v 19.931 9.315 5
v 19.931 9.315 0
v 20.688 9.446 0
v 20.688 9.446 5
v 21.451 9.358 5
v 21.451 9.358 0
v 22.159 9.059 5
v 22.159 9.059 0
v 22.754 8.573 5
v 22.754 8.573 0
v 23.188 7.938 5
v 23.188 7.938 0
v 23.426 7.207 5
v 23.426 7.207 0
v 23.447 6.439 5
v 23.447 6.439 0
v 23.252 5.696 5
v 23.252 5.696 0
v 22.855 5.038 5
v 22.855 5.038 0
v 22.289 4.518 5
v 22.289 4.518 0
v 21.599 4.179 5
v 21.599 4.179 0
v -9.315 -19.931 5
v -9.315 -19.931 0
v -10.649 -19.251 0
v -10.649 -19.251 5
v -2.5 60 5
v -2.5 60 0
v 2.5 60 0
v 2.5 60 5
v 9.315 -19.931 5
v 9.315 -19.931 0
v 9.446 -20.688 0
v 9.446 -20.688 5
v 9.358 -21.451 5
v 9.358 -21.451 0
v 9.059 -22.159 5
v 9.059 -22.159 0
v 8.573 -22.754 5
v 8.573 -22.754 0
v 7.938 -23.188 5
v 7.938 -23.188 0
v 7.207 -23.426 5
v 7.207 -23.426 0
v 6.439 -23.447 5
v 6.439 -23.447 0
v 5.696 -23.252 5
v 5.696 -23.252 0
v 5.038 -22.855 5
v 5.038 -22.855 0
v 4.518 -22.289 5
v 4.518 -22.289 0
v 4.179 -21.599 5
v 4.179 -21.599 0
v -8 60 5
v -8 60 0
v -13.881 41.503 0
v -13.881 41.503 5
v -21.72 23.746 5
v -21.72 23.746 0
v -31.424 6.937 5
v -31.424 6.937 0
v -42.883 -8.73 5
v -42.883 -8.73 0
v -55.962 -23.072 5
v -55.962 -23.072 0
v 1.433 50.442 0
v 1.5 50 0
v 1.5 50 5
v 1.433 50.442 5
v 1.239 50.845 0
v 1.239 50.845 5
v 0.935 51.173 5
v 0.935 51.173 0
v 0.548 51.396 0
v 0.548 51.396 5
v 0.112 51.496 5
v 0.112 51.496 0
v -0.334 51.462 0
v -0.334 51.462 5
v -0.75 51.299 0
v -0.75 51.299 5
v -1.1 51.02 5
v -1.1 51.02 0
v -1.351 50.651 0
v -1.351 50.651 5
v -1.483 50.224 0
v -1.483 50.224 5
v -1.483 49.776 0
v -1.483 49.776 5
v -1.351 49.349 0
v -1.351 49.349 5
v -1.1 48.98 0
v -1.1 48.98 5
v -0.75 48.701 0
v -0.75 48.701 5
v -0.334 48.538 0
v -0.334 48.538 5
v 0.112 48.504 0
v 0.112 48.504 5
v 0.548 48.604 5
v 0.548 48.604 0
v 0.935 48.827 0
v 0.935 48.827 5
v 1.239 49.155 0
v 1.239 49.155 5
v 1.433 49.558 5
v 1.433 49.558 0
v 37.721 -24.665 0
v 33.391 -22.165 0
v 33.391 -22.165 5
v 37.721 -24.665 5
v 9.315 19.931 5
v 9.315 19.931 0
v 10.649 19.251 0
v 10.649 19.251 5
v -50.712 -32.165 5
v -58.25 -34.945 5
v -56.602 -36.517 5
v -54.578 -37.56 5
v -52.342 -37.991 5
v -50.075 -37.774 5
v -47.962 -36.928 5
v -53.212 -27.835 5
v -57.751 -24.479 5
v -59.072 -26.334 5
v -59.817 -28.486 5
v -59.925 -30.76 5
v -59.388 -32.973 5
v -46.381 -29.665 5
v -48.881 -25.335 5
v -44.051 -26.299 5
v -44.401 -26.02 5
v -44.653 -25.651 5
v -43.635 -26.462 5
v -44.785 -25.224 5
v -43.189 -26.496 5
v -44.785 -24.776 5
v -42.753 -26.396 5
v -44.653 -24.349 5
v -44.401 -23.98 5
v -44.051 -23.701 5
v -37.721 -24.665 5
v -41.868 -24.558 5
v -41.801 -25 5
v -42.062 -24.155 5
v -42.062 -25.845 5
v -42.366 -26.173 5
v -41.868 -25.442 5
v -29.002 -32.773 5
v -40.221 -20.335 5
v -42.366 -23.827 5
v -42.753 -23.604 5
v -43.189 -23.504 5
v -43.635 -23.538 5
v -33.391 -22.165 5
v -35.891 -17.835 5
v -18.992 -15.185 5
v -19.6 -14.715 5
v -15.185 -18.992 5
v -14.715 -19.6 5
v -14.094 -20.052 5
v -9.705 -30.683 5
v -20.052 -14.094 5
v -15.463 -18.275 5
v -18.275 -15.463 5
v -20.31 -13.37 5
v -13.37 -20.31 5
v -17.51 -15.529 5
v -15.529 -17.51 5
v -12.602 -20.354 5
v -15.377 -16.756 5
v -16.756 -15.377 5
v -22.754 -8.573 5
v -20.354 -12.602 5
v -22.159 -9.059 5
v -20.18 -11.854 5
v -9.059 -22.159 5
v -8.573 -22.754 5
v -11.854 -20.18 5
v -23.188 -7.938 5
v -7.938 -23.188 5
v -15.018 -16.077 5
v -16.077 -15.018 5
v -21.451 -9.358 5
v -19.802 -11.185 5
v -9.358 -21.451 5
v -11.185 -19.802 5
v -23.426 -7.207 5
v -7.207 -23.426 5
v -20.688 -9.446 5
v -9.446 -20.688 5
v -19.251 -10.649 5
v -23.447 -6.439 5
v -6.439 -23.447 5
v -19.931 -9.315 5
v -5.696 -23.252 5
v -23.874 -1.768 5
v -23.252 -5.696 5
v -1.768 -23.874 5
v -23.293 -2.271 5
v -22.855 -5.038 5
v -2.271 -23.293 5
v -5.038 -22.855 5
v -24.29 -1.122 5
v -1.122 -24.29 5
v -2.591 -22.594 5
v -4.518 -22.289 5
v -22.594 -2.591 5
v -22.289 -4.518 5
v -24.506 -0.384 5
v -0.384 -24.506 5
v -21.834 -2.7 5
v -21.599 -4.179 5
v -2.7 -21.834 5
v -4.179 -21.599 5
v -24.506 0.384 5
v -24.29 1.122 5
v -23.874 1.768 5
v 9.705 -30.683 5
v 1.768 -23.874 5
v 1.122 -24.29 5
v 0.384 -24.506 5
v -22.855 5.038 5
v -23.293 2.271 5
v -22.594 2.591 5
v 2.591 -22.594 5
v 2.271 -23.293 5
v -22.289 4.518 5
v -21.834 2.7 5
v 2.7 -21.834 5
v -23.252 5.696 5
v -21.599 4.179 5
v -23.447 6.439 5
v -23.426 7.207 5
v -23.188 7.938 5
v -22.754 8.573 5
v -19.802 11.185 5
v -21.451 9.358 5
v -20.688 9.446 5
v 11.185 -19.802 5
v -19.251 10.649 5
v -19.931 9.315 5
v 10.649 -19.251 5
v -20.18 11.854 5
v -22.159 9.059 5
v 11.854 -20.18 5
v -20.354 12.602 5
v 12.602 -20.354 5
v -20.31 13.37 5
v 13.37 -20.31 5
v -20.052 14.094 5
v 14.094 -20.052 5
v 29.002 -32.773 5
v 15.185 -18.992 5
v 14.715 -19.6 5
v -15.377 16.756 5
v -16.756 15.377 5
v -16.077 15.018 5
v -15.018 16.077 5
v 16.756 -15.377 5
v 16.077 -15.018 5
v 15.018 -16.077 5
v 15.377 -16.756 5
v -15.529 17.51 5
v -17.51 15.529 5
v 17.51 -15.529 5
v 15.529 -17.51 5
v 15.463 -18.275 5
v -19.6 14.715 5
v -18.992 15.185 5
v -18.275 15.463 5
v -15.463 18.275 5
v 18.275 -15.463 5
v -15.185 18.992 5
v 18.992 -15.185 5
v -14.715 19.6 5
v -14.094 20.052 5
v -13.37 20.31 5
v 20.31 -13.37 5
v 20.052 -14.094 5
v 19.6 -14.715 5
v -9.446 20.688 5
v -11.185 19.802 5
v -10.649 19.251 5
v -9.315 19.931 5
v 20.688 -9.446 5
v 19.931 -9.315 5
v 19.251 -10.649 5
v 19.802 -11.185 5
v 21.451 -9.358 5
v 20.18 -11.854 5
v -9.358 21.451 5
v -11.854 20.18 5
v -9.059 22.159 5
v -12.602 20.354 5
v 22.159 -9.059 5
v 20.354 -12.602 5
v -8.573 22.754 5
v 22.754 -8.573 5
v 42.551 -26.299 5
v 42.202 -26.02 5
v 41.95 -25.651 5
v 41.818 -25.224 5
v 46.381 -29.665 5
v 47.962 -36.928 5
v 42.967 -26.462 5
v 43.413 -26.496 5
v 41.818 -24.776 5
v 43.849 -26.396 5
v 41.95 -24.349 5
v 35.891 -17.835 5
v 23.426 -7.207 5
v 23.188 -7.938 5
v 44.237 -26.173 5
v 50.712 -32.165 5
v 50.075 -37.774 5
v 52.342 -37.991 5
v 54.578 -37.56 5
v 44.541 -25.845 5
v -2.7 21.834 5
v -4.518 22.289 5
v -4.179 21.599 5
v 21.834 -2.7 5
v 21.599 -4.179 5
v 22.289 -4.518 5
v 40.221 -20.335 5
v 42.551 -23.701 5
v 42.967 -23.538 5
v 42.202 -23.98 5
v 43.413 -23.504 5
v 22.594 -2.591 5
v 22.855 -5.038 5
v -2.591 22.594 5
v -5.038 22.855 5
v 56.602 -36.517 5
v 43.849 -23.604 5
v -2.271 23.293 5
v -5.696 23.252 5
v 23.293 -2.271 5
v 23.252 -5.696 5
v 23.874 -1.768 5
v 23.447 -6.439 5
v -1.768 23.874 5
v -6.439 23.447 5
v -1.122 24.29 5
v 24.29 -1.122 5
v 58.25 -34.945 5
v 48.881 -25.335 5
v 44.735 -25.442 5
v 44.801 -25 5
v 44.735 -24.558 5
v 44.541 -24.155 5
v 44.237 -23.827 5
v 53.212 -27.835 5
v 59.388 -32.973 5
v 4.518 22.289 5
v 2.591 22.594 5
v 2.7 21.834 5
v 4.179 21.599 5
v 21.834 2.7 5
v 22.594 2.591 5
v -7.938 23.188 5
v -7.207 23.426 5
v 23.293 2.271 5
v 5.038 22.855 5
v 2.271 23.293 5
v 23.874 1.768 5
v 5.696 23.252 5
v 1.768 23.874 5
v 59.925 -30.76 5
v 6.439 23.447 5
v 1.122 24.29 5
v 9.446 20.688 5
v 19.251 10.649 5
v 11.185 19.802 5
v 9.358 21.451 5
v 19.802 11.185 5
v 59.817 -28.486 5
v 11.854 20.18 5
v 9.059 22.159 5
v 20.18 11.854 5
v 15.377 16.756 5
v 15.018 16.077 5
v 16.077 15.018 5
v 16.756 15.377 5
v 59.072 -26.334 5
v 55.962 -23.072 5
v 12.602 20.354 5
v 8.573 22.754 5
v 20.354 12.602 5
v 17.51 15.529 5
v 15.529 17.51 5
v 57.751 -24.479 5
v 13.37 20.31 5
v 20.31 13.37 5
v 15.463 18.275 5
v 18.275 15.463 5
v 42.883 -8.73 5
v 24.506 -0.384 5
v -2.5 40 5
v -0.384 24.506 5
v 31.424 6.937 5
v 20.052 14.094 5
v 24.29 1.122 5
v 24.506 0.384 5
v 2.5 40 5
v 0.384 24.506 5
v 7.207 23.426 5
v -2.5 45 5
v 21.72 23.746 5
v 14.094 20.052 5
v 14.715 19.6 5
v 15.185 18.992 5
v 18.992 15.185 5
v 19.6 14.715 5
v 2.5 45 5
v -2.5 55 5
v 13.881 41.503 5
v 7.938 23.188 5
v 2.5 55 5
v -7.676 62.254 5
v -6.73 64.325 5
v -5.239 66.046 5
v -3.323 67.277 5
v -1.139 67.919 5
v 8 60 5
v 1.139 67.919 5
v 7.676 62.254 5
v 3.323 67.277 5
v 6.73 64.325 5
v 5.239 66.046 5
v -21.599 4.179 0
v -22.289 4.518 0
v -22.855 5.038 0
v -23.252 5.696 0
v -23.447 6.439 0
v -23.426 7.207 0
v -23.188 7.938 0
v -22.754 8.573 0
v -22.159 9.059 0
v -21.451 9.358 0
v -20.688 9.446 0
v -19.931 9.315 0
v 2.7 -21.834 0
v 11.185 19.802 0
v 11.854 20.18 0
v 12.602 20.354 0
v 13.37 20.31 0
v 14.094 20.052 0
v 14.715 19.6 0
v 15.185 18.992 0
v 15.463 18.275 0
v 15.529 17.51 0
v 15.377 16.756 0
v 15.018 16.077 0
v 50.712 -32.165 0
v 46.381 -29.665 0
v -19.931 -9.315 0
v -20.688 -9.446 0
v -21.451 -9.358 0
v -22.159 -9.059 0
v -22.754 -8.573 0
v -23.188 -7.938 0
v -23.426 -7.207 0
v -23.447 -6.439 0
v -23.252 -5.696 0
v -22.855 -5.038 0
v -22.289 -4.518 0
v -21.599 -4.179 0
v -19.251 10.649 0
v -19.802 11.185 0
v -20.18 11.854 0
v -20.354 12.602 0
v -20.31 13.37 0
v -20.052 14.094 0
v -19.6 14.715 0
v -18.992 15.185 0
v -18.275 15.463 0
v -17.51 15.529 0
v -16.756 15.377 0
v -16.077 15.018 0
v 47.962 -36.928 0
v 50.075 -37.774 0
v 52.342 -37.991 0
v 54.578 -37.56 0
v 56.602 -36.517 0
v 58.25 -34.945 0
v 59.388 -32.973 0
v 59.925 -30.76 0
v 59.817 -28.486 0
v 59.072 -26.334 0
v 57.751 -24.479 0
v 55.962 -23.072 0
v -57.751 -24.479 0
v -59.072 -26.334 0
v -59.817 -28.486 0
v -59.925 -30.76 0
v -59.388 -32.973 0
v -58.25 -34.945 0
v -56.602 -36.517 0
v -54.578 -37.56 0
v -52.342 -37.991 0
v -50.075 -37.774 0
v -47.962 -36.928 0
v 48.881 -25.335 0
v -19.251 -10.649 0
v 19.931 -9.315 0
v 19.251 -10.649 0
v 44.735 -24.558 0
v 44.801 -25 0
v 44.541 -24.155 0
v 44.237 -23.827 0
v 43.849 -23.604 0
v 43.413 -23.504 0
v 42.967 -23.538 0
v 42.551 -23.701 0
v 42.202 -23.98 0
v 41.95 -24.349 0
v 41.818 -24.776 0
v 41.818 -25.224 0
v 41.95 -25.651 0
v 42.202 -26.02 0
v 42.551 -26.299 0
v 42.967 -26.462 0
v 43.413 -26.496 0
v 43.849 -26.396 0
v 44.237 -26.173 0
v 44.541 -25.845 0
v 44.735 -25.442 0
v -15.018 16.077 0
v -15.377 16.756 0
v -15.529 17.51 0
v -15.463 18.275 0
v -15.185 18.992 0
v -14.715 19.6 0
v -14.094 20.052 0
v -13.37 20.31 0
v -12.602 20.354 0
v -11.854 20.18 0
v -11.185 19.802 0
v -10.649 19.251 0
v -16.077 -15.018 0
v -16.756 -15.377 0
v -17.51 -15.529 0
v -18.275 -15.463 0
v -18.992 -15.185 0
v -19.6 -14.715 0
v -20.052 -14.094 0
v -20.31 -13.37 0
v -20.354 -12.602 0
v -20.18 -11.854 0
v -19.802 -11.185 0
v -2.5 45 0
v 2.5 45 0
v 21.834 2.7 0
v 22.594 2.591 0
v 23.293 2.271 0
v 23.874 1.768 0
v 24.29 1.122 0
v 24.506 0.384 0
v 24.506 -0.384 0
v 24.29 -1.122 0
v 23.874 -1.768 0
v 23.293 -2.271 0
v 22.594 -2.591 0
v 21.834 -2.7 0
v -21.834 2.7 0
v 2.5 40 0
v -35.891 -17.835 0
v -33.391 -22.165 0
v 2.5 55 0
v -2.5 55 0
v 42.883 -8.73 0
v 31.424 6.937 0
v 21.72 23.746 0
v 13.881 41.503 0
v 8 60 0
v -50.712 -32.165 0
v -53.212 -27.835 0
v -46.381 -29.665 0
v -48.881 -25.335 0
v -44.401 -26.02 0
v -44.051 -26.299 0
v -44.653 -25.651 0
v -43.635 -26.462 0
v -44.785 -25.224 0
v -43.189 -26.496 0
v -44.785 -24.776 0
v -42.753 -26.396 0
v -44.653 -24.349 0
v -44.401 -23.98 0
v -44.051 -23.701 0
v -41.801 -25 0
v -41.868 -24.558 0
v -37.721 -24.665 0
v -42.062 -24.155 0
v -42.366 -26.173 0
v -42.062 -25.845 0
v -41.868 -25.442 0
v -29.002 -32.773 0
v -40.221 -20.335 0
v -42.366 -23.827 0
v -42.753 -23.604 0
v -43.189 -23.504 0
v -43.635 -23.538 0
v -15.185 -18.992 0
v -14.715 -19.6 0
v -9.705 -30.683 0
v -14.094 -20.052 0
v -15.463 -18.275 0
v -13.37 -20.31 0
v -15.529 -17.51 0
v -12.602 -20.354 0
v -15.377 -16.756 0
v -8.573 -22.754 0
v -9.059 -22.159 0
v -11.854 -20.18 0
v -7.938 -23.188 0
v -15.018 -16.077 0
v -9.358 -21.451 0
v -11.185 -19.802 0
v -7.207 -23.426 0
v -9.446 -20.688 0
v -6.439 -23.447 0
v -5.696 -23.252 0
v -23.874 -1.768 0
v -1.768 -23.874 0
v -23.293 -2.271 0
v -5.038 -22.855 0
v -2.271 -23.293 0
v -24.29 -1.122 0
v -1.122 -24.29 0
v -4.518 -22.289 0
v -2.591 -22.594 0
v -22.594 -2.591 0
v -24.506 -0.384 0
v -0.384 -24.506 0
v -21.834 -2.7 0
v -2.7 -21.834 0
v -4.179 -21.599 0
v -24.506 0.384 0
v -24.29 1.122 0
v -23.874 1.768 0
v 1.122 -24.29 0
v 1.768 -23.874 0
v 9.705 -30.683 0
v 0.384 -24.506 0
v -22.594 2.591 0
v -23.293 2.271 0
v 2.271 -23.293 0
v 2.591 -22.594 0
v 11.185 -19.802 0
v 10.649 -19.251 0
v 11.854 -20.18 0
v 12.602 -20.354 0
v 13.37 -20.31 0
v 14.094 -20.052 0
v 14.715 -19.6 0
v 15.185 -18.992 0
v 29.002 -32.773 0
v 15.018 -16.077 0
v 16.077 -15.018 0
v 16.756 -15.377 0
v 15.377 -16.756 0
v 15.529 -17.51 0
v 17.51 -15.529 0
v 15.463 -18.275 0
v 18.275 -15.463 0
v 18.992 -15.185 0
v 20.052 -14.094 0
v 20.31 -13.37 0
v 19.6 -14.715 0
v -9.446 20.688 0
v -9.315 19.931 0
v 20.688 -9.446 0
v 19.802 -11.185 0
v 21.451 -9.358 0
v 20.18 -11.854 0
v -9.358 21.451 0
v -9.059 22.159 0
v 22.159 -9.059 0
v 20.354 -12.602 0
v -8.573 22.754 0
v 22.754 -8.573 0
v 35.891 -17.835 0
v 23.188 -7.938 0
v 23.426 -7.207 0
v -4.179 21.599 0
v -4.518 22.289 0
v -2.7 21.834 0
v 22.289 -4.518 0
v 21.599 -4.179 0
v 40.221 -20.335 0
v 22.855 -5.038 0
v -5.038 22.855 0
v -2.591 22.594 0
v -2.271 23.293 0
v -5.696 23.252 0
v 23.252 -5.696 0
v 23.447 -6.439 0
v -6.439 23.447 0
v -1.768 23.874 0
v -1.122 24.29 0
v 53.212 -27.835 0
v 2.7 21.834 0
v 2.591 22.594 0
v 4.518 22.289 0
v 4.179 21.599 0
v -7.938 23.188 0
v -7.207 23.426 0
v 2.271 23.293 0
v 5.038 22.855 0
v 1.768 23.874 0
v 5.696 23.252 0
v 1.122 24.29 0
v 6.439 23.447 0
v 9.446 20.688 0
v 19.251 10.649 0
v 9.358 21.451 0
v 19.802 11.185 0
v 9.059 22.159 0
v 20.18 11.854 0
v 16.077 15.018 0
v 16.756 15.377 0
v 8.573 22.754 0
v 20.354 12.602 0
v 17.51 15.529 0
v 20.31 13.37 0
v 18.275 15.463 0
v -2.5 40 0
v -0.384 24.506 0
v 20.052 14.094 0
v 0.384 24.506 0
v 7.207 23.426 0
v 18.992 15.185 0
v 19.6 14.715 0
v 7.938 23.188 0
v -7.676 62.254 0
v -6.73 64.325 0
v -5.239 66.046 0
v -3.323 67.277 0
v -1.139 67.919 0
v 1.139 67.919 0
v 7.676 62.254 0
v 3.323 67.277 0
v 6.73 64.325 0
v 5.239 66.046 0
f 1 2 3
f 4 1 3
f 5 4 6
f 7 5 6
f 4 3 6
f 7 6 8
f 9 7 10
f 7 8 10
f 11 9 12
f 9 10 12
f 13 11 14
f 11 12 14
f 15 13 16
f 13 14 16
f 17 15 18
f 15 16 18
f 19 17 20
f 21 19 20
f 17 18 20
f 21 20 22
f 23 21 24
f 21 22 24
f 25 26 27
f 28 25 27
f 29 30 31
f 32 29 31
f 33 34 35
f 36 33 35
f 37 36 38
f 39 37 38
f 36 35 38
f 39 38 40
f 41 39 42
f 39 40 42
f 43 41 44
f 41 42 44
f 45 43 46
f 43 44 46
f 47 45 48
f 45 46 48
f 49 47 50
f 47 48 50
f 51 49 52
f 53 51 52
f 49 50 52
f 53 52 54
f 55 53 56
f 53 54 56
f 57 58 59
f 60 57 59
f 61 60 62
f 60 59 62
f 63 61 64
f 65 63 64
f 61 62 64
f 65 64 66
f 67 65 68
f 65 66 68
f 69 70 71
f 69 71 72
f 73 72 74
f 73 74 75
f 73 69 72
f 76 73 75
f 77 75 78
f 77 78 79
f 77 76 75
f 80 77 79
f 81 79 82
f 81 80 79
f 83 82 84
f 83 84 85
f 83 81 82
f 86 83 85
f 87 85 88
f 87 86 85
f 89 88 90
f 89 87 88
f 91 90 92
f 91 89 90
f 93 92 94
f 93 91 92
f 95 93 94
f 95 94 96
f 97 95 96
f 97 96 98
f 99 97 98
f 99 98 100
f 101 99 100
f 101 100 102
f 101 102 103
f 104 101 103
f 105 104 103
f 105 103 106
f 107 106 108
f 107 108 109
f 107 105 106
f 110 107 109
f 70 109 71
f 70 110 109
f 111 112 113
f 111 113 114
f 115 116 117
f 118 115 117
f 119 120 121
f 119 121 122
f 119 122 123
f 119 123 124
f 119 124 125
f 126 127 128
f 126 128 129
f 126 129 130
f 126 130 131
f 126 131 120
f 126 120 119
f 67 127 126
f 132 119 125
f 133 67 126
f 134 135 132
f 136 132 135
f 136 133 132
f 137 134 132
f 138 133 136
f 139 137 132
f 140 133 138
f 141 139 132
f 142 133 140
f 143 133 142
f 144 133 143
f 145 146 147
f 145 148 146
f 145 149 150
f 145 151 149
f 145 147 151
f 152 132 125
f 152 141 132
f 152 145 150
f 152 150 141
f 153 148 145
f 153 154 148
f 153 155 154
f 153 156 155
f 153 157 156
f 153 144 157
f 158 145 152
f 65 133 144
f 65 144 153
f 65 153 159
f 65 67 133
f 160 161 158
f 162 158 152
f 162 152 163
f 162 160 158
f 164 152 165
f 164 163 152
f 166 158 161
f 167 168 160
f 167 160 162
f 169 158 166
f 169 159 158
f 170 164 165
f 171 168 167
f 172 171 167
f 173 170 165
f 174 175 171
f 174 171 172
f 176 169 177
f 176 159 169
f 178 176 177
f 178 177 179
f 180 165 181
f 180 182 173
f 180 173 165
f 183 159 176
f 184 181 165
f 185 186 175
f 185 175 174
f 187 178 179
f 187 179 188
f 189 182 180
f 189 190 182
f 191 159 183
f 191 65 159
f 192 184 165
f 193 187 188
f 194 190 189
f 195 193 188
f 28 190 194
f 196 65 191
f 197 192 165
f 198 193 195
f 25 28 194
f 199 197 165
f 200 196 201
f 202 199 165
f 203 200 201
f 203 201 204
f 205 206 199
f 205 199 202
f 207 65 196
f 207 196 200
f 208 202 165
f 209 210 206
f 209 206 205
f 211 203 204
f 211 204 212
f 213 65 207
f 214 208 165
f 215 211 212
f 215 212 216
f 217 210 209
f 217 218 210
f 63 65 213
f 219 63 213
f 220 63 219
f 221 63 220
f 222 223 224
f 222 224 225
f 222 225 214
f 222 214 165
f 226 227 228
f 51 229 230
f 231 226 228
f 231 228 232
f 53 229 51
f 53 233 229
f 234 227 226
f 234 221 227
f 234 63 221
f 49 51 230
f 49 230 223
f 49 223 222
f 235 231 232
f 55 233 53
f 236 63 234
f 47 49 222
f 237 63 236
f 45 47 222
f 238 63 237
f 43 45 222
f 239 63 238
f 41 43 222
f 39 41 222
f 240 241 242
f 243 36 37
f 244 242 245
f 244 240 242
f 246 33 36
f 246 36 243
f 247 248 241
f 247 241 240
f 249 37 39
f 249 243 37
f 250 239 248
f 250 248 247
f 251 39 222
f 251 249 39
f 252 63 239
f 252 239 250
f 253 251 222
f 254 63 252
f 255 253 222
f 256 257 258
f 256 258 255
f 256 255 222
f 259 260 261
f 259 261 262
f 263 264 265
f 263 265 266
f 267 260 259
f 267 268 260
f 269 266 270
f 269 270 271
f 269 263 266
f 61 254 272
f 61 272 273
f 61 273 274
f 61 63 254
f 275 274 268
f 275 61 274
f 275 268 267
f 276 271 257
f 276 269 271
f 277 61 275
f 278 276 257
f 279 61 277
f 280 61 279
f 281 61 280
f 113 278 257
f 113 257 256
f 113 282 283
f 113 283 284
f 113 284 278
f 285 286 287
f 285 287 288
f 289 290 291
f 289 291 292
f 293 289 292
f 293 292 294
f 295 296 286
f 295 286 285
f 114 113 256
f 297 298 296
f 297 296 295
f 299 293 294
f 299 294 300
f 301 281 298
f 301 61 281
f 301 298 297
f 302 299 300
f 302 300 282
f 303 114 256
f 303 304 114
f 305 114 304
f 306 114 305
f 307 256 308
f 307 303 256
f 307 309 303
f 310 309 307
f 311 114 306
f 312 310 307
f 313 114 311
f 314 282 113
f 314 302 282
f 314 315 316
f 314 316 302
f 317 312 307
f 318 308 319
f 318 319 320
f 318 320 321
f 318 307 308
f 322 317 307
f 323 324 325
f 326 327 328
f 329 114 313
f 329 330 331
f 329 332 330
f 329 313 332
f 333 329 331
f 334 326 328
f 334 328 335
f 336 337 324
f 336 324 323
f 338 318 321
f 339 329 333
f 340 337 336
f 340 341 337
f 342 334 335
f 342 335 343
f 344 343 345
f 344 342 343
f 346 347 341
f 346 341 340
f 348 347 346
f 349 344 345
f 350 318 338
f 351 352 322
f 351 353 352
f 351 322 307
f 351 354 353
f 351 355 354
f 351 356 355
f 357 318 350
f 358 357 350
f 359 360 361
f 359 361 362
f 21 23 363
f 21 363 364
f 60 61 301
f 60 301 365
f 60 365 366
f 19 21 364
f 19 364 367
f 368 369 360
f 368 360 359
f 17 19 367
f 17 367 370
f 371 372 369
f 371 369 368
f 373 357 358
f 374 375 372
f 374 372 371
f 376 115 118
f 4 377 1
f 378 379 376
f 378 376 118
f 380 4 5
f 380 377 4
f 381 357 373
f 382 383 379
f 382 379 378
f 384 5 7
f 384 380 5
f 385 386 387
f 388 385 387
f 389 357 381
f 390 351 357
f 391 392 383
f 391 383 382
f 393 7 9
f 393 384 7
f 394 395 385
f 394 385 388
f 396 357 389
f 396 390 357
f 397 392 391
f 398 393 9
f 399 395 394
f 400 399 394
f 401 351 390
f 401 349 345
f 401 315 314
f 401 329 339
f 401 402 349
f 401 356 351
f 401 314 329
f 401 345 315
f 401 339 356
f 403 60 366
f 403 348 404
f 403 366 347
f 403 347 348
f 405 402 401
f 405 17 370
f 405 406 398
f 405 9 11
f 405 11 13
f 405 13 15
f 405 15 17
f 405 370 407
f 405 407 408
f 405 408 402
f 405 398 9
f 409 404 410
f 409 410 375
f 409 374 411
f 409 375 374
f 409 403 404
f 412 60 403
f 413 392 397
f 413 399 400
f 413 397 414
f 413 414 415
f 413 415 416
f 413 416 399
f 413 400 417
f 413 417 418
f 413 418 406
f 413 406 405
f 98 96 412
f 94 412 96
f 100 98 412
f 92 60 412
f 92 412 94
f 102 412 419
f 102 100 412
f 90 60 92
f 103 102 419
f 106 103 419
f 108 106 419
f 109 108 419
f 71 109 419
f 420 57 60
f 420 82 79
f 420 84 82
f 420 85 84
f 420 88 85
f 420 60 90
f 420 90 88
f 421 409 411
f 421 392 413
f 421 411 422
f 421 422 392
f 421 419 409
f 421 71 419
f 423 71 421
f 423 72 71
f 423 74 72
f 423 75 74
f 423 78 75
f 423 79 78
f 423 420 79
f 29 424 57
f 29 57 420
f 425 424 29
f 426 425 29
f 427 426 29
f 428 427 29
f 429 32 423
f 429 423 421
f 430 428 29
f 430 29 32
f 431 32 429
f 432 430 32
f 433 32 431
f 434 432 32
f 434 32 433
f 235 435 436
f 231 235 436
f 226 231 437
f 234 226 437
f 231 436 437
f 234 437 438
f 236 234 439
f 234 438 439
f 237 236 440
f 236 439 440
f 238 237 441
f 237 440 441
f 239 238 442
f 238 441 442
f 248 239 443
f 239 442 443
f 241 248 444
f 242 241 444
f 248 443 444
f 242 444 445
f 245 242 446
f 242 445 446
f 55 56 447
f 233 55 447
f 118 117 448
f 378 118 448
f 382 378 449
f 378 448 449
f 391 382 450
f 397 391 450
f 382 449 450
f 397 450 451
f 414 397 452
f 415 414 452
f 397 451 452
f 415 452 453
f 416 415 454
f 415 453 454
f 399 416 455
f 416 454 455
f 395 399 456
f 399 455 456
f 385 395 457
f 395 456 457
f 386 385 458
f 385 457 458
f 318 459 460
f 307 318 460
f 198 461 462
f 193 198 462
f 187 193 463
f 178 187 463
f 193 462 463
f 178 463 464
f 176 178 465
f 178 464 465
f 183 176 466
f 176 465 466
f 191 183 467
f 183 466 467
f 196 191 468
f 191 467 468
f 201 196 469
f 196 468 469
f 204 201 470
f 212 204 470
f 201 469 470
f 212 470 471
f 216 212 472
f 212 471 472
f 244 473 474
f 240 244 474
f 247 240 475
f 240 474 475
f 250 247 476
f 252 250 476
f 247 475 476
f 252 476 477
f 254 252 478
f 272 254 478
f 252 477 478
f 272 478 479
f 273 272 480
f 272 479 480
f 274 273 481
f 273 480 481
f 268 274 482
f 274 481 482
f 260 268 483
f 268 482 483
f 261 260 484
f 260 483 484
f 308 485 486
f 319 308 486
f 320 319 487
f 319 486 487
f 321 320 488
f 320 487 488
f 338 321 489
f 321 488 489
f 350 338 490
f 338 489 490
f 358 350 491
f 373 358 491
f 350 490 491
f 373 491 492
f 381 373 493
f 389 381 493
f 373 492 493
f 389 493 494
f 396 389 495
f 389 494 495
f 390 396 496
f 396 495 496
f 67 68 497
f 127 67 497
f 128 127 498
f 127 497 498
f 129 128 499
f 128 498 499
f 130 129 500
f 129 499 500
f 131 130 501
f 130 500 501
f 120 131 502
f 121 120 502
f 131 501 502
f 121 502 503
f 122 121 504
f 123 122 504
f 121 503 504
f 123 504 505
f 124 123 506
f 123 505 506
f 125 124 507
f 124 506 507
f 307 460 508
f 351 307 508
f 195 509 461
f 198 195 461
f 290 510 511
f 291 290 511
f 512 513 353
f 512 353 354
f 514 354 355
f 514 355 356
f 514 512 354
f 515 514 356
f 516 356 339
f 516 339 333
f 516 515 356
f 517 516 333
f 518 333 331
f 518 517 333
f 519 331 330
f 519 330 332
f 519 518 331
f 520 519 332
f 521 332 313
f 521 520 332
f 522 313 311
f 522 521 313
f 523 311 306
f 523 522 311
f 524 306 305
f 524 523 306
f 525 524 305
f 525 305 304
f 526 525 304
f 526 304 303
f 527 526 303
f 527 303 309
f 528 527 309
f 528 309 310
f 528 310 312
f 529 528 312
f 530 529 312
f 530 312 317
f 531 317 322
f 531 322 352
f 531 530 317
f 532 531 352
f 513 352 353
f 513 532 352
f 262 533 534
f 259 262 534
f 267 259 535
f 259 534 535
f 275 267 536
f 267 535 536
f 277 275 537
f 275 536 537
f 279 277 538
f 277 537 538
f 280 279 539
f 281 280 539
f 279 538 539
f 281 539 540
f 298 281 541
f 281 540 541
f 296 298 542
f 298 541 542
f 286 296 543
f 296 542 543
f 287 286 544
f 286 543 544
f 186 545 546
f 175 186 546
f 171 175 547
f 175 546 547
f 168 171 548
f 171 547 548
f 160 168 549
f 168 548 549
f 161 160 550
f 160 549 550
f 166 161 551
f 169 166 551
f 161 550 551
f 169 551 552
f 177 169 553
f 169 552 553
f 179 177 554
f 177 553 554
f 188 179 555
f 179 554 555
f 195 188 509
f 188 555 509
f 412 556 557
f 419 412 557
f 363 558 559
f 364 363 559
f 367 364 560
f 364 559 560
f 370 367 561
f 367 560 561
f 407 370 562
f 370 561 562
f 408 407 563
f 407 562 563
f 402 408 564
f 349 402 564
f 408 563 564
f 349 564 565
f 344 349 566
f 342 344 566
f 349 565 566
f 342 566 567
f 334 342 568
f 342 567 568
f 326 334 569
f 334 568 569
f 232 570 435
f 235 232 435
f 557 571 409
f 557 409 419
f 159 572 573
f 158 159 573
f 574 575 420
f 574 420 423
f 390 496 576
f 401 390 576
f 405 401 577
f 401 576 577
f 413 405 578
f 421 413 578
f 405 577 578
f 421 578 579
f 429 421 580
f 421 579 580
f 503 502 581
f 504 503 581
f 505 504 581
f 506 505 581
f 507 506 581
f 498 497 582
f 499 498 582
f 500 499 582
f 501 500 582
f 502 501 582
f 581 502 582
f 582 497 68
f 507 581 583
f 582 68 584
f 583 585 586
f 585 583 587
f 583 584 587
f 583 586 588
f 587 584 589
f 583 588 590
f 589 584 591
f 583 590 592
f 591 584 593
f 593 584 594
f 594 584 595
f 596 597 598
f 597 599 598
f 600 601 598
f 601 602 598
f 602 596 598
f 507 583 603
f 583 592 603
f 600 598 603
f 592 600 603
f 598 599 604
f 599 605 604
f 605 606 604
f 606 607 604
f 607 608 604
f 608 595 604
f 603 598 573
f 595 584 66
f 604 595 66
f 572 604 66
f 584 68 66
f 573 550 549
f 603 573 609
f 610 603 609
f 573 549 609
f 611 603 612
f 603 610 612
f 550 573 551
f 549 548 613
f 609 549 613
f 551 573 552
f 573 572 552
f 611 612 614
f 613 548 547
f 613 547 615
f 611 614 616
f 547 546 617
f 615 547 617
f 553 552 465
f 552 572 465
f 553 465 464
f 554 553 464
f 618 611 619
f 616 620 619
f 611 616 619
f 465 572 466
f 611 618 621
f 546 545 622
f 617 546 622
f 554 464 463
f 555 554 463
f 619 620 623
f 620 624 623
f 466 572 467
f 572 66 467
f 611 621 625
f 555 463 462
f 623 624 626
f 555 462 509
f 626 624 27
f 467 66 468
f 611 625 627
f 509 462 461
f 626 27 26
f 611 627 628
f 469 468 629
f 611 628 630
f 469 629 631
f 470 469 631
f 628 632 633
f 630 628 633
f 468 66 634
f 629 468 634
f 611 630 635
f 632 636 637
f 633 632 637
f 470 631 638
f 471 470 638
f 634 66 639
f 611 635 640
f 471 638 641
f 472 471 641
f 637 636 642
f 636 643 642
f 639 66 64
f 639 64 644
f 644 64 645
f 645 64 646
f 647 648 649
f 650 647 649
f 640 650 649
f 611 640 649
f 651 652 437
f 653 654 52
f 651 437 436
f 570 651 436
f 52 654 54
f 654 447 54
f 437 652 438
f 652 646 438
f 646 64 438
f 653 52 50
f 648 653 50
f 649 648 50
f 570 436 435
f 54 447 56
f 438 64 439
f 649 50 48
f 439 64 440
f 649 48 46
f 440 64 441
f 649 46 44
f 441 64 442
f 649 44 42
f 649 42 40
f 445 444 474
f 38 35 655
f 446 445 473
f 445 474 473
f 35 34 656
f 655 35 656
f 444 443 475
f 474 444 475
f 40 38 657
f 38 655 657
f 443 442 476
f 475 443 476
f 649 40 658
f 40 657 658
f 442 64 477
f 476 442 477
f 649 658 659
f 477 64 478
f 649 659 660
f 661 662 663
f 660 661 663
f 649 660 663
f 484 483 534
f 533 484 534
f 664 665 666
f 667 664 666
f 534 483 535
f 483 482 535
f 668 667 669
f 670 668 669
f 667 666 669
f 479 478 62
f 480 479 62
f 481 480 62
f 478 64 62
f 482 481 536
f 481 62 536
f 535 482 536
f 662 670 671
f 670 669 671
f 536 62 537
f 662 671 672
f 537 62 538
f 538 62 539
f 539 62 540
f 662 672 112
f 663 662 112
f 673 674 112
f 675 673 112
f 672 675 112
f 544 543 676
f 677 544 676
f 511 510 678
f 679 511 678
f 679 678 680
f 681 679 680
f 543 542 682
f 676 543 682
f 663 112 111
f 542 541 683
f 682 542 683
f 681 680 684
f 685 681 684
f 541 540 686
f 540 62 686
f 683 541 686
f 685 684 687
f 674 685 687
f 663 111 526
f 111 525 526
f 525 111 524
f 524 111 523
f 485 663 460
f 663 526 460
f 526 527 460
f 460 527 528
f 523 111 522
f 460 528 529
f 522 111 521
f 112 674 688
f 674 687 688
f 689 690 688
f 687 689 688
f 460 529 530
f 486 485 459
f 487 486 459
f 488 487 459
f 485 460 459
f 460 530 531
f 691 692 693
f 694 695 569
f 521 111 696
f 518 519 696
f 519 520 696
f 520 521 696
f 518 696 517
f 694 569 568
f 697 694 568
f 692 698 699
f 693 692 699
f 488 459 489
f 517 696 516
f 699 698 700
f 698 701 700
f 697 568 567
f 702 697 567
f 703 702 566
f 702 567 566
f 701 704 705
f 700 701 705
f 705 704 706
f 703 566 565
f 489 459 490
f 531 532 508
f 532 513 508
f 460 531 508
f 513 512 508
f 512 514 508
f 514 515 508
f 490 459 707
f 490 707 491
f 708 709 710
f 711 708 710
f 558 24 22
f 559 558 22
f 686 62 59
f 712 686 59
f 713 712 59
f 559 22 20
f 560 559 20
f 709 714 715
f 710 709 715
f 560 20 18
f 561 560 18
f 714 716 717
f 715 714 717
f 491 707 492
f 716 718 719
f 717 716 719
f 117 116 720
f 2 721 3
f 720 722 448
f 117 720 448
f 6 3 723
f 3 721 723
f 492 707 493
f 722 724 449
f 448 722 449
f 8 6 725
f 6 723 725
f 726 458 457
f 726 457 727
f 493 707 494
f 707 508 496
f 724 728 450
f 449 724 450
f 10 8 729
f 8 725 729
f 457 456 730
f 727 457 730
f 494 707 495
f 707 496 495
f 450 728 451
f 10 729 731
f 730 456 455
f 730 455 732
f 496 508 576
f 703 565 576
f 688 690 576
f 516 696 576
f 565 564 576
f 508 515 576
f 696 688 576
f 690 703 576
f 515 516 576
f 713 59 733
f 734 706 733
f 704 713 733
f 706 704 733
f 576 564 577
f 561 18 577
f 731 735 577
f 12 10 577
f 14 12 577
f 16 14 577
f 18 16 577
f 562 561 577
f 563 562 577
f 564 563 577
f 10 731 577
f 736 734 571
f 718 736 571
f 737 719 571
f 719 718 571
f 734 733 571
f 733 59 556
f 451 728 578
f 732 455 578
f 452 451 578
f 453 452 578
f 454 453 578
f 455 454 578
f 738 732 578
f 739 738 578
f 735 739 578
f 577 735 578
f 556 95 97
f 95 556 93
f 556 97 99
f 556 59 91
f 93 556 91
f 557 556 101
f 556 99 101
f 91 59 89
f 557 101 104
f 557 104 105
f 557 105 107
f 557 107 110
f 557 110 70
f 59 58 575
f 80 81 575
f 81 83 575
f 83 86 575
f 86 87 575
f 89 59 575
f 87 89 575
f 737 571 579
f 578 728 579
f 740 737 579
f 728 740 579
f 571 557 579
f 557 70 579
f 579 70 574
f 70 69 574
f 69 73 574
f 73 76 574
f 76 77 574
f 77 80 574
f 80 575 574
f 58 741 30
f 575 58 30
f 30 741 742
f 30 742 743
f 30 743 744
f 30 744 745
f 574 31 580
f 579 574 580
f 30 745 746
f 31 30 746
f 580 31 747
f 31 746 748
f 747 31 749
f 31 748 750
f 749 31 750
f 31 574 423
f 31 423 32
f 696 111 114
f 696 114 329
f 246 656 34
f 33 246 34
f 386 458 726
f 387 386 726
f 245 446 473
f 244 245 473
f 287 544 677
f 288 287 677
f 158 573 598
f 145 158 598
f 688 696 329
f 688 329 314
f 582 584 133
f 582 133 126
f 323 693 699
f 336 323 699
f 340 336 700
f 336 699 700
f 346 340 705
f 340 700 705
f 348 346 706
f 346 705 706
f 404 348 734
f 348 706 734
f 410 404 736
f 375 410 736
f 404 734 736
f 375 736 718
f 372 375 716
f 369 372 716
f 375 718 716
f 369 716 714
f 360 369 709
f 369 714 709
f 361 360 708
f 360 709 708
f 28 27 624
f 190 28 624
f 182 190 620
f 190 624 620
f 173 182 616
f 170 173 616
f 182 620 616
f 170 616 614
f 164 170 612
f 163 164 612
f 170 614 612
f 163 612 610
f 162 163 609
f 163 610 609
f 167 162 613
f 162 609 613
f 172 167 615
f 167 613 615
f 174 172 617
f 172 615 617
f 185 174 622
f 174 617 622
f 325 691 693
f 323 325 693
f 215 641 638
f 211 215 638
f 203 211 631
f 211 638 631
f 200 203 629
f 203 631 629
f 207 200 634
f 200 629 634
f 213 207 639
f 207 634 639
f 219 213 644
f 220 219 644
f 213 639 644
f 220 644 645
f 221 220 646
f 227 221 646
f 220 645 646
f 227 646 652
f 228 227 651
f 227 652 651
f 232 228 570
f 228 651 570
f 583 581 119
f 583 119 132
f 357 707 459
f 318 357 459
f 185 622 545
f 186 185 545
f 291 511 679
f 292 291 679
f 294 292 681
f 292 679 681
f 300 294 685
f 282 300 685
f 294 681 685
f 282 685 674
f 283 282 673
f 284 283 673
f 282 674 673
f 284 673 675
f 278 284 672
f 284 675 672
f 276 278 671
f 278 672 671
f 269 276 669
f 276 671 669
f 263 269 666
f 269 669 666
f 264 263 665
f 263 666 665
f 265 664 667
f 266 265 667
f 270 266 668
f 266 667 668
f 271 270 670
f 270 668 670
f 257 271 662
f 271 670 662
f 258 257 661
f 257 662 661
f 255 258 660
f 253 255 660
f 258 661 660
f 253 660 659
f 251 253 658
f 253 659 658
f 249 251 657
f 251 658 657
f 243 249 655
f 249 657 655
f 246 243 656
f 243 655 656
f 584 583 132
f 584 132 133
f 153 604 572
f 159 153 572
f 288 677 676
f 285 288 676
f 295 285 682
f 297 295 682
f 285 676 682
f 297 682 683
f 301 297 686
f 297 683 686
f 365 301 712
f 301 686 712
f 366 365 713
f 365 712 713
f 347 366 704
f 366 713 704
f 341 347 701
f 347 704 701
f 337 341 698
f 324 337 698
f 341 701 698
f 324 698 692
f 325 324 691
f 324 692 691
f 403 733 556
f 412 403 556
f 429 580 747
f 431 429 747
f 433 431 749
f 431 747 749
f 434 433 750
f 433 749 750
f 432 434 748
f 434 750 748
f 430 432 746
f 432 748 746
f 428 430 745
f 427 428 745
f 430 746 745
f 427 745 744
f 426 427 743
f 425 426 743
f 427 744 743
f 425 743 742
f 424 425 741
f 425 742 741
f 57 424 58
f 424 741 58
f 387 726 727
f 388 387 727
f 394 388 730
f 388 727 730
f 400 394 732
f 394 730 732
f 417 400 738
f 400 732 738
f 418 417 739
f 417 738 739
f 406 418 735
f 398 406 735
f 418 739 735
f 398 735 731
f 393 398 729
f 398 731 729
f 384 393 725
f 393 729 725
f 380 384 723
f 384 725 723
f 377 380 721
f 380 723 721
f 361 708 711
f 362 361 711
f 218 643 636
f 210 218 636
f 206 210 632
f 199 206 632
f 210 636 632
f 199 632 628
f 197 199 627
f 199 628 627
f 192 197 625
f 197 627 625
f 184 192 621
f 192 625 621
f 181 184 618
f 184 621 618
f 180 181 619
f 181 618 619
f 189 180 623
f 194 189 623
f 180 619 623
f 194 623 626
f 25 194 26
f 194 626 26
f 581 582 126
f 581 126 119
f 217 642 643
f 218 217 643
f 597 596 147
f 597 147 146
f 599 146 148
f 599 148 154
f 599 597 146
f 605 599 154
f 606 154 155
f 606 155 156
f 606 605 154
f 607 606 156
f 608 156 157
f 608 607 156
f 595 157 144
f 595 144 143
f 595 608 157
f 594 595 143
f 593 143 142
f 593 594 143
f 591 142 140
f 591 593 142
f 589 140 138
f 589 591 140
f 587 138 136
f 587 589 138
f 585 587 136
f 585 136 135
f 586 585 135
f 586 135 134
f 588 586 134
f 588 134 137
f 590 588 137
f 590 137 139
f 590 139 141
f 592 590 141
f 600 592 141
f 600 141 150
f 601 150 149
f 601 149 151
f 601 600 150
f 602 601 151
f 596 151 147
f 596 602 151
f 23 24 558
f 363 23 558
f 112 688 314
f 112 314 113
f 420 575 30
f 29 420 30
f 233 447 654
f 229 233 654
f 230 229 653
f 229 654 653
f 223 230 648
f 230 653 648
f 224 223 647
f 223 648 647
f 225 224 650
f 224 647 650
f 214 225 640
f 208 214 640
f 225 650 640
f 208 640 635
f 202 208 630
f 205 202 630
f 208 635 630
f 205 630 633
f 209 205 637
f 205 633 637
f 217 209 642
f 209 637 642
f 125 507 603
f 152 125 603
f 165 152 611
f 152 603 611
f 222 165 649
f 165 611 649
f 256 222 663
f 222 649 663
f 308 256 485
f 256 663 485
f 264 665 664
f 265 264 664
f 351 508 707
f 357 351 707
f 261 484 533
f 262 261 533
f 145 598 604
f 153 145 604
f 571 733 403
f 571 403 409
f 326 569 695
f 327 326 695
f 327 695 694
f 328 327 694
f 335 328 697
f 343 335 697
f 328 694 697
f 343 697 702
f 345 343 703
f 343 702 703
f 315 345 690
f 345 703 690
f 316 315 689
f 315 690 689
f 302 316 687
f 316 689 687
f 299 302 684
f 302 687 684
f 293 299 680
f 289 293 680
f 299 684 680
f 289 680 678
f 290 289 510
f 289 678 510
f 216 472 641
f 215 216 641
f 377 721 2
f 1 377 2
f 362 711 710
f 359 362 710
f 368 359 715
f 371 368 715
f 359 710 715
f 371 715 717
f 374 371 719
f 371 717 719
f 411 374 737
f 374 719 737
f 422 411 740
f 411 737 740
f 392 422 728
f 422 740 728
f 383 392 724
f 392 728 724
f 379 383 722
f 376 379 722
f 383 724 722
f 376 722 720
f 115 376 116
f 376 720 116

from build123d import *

# Parameters (mm, degrees)
ESQUISSE1_R        = 1.5
ESQUISSE1_W        = 5
ESQUISSE1_H        = 5
BOSS_EXTRU_1_DEPTH = 5


with BuildPart() as part:
    # Esquisse1 → Boss.-Extru.1 (new body)
    with BuildSketch(Plane.XY):
        with BuildLine():
            ThreePointArc((-55.961524227, -23.07179677), (-58.889727457, -34), (-47.961524227, -36.92820323))
            ThreePointArc((-47.961524227, -36.92820323), (0, -30.420831874), (47.961524227, -36.92820323))
            ThreePointArc((47.961524227, -36.92820323), (58.889727457, -34), (55.961524227, -23.07179677))
            ThreePointArc((55.961524227, -23.07179677), (26.345213207, 15.210415937), (8, 60))
            ThreePointArc((8, 60), (0, 68), (-8, 60))
            ThreePointArc((-8, 60), (-26.345213207, 15.210415937), (-55.961524227, -23.07179677))
        make_face()
        with Locations((43.301270189, -25)):
            Circle(ESQUISSE1_R, mode=Mode.SUBTRACT)
        with Locations((0, 50)):
            Circle(ESQUISSE1_R, mode=Mode.SUBTRACT)
        with Locations((-43.301270189, -25)):
            Circle(ESQUISSE1_R, mode=Mode.SUBTRACT)
        with BuildLine():
            Line((2.7, 21.833689565), (4.179128531, 21.59941862))
            ThreePointArc((4.179128531, 21.59941862), (7.58132701, 23.332925329), (9.314833719, 19.93072685))
            Line((9.314833719, 19.93072685), (10.649174844, 19.250846089))
            ThreePointArc((10.649174844, 19.250846089), (14.42054091, 19.848171792), (15.017866614, 16.076805726))
            Line((15.017866614, 16.076805726), (16.076805726, 15.017866614))
            ThreePointArc((16.076805726, 15.017866614), (19.848171792, 14.42054091), (19.250846089, 10.649174844))
            Line((19.250846089, 10.649174844), (19.93072685, 9.314833719))
            ThreePointArc((19.93072685, 9.314833719), (23.332925329, 7.58132701), (21.59941862, 4.179128531))
            Line((21.59941862, 4.179128531), (21.833689565, 2.7))
            ThreePointArc((21.833689565, 2.7), (24.533689565, 0), (21.833689565, -2.7))
            Line((21.833689565, -2.7), (21.59941862, -4.179128531))
            ThreePointArc((21.59941862, -4.179128531), (23.332925329, -7.58132701), (19.93072685, -9.314833719))
            Line((19.93072685, -9.314833719), (19.250846089, -10.649174844))
            ThreePointArc((19.250846089, -10.649174844), (19.848171792, -14.42054091), (16.076805726, -15.017866614))
            Line((16.076805726, -15.017866614), (15.017866614, -16.076805726))
            ThreePointArc((15.017866614, -16.076805726), (14.42054091, -19.848171792), (10.649174844, -19.250846089))
            Line((10.649174844, -19.250846089), (9.314833719, -19.93072685))
            ThreePointArc((9.314833719, -19.93072685), (7.58132701, -23.332925329), (4.179128531, -21.59941862))
            Line((4.179128531, -21.59941862), (2.7, -21.833689565))
            ThreePointArc((2.7, -21.833689565), (0, -24.533689565), (-2.7, -21.833689565))
            Line((-2.7, -21.833689565), (-4.179128531, -21.59941862))
            ThreePointArc((-4.179128531, -21.59941862), (-7.58132701, -23.332925329), (-9.314833719, -19.93072685))
            Line((-9.314833719, -19.93072685), (-10.649174844, -19.250846089))
            ThreePointArc((-10.649174844, -19.250846089), (-14.42054091, -19.848171792), (-15.017866614, -16.076805726))
            Line((-15.017866614, -16.076805726), (-16.076805726, -15.017866614))
            ThreePointArc((-16.076805726, -15.017866614), (-19.848171792, -14.42054091), (-19.250846089, -10.649174844))
            Line((-19.250846089, -10.649174844), (-19.93072685, -9.314833719))
            ThreePointArc((-19.93072685, -9.314833719), (-23.332925329, -7.58132701), (-21.59941862, -4.179128531))
            Line((-21.59941862, -4.179128531), (-21.833689565, -2.7))
            ThreePointArc((-21.833689565, -2.7), (-24.533689565, 0), (-21.833689565, 2.7))
            Line((-21.833689565, 2.7), (-21.59941862, 4.179128531))
            ThreePointArc((-21.59941862, 4.179128531), (-23.332925329, 7.58132701), (-19.93072685, 9.314833719))
            Line((-19.93072685, 9.314833719), (-19.250846089, 10.649174844))
            ThreePointArc((-19.250846089, 10.649174844), (-19.848171792, 14.42054091), (-16.076805726, 15.017866614))
            Line((-16.076805726, 15.017866614), (-15.017866614, 16.076805726))
            ThreePointArc((-15.017866614, 16.076805726), (-14.42054091, 19.848171792), (-10.649174844, 19.250846089))
            Line((-10.649174844, 19.250846089), (-9.314833719, 19.93072685))
            ThreePointArc((-9.314833719, 19.93072685), (-7.58132701, 23.332925329), (-4.179128531, 21.59941862))
            Line((-4.179128531, 21.59941862), (-2.7, 21.833689565))
            ThreePointArc((-2.7, 21.833689565), (0, 24.533689565), (2.7, 21.833689565))
        make_face(mode=Mode.SUBTRACT)
        Polygon((40.22114317, -20.334936491), (35.891016151, -17.834936491), (33.391016151, -22.165063509), (37.72114317, -24.665063509), align=None, mode=Mode.SUBTRACT)
        Polygon((48.881397208, -25.334936491), (53.211524227, -27.834936491), (50.711524227, -32.165063509), (46.381397208, -29.665063509), align=None, mode=Mode.SUBTRACT)
        with Locations((0, 57.5)):
            Rectangle(ESQUISSE1_W, ESQUISSE1_H, mode=Mode.SUBTRACT)
        with Locations((0, 42.5)):
            Rectangle(ESQUISSE1_W, ESQUISSE1_H, mode=Mode.SUBTRACT)
        Polygon((-48.881397208, -25.334936491), (-53.211524227, -27.834936491), (-50.711524227, -32.165063509), (-46.381397208, -29.665063509), align=None, mode=Mode.SUBTRACT)
        Polygon((-40.22114317, -20.334936491), (-35.891016151, -17.834936491), (-33.391016151, -22.165063509), (-37.72114317, -24.665063509), align=None, mode=Mode.SUBTRACT)
    extrude(amount=BOSS_EXTRU_1_DEPTH)


solid = part.part
